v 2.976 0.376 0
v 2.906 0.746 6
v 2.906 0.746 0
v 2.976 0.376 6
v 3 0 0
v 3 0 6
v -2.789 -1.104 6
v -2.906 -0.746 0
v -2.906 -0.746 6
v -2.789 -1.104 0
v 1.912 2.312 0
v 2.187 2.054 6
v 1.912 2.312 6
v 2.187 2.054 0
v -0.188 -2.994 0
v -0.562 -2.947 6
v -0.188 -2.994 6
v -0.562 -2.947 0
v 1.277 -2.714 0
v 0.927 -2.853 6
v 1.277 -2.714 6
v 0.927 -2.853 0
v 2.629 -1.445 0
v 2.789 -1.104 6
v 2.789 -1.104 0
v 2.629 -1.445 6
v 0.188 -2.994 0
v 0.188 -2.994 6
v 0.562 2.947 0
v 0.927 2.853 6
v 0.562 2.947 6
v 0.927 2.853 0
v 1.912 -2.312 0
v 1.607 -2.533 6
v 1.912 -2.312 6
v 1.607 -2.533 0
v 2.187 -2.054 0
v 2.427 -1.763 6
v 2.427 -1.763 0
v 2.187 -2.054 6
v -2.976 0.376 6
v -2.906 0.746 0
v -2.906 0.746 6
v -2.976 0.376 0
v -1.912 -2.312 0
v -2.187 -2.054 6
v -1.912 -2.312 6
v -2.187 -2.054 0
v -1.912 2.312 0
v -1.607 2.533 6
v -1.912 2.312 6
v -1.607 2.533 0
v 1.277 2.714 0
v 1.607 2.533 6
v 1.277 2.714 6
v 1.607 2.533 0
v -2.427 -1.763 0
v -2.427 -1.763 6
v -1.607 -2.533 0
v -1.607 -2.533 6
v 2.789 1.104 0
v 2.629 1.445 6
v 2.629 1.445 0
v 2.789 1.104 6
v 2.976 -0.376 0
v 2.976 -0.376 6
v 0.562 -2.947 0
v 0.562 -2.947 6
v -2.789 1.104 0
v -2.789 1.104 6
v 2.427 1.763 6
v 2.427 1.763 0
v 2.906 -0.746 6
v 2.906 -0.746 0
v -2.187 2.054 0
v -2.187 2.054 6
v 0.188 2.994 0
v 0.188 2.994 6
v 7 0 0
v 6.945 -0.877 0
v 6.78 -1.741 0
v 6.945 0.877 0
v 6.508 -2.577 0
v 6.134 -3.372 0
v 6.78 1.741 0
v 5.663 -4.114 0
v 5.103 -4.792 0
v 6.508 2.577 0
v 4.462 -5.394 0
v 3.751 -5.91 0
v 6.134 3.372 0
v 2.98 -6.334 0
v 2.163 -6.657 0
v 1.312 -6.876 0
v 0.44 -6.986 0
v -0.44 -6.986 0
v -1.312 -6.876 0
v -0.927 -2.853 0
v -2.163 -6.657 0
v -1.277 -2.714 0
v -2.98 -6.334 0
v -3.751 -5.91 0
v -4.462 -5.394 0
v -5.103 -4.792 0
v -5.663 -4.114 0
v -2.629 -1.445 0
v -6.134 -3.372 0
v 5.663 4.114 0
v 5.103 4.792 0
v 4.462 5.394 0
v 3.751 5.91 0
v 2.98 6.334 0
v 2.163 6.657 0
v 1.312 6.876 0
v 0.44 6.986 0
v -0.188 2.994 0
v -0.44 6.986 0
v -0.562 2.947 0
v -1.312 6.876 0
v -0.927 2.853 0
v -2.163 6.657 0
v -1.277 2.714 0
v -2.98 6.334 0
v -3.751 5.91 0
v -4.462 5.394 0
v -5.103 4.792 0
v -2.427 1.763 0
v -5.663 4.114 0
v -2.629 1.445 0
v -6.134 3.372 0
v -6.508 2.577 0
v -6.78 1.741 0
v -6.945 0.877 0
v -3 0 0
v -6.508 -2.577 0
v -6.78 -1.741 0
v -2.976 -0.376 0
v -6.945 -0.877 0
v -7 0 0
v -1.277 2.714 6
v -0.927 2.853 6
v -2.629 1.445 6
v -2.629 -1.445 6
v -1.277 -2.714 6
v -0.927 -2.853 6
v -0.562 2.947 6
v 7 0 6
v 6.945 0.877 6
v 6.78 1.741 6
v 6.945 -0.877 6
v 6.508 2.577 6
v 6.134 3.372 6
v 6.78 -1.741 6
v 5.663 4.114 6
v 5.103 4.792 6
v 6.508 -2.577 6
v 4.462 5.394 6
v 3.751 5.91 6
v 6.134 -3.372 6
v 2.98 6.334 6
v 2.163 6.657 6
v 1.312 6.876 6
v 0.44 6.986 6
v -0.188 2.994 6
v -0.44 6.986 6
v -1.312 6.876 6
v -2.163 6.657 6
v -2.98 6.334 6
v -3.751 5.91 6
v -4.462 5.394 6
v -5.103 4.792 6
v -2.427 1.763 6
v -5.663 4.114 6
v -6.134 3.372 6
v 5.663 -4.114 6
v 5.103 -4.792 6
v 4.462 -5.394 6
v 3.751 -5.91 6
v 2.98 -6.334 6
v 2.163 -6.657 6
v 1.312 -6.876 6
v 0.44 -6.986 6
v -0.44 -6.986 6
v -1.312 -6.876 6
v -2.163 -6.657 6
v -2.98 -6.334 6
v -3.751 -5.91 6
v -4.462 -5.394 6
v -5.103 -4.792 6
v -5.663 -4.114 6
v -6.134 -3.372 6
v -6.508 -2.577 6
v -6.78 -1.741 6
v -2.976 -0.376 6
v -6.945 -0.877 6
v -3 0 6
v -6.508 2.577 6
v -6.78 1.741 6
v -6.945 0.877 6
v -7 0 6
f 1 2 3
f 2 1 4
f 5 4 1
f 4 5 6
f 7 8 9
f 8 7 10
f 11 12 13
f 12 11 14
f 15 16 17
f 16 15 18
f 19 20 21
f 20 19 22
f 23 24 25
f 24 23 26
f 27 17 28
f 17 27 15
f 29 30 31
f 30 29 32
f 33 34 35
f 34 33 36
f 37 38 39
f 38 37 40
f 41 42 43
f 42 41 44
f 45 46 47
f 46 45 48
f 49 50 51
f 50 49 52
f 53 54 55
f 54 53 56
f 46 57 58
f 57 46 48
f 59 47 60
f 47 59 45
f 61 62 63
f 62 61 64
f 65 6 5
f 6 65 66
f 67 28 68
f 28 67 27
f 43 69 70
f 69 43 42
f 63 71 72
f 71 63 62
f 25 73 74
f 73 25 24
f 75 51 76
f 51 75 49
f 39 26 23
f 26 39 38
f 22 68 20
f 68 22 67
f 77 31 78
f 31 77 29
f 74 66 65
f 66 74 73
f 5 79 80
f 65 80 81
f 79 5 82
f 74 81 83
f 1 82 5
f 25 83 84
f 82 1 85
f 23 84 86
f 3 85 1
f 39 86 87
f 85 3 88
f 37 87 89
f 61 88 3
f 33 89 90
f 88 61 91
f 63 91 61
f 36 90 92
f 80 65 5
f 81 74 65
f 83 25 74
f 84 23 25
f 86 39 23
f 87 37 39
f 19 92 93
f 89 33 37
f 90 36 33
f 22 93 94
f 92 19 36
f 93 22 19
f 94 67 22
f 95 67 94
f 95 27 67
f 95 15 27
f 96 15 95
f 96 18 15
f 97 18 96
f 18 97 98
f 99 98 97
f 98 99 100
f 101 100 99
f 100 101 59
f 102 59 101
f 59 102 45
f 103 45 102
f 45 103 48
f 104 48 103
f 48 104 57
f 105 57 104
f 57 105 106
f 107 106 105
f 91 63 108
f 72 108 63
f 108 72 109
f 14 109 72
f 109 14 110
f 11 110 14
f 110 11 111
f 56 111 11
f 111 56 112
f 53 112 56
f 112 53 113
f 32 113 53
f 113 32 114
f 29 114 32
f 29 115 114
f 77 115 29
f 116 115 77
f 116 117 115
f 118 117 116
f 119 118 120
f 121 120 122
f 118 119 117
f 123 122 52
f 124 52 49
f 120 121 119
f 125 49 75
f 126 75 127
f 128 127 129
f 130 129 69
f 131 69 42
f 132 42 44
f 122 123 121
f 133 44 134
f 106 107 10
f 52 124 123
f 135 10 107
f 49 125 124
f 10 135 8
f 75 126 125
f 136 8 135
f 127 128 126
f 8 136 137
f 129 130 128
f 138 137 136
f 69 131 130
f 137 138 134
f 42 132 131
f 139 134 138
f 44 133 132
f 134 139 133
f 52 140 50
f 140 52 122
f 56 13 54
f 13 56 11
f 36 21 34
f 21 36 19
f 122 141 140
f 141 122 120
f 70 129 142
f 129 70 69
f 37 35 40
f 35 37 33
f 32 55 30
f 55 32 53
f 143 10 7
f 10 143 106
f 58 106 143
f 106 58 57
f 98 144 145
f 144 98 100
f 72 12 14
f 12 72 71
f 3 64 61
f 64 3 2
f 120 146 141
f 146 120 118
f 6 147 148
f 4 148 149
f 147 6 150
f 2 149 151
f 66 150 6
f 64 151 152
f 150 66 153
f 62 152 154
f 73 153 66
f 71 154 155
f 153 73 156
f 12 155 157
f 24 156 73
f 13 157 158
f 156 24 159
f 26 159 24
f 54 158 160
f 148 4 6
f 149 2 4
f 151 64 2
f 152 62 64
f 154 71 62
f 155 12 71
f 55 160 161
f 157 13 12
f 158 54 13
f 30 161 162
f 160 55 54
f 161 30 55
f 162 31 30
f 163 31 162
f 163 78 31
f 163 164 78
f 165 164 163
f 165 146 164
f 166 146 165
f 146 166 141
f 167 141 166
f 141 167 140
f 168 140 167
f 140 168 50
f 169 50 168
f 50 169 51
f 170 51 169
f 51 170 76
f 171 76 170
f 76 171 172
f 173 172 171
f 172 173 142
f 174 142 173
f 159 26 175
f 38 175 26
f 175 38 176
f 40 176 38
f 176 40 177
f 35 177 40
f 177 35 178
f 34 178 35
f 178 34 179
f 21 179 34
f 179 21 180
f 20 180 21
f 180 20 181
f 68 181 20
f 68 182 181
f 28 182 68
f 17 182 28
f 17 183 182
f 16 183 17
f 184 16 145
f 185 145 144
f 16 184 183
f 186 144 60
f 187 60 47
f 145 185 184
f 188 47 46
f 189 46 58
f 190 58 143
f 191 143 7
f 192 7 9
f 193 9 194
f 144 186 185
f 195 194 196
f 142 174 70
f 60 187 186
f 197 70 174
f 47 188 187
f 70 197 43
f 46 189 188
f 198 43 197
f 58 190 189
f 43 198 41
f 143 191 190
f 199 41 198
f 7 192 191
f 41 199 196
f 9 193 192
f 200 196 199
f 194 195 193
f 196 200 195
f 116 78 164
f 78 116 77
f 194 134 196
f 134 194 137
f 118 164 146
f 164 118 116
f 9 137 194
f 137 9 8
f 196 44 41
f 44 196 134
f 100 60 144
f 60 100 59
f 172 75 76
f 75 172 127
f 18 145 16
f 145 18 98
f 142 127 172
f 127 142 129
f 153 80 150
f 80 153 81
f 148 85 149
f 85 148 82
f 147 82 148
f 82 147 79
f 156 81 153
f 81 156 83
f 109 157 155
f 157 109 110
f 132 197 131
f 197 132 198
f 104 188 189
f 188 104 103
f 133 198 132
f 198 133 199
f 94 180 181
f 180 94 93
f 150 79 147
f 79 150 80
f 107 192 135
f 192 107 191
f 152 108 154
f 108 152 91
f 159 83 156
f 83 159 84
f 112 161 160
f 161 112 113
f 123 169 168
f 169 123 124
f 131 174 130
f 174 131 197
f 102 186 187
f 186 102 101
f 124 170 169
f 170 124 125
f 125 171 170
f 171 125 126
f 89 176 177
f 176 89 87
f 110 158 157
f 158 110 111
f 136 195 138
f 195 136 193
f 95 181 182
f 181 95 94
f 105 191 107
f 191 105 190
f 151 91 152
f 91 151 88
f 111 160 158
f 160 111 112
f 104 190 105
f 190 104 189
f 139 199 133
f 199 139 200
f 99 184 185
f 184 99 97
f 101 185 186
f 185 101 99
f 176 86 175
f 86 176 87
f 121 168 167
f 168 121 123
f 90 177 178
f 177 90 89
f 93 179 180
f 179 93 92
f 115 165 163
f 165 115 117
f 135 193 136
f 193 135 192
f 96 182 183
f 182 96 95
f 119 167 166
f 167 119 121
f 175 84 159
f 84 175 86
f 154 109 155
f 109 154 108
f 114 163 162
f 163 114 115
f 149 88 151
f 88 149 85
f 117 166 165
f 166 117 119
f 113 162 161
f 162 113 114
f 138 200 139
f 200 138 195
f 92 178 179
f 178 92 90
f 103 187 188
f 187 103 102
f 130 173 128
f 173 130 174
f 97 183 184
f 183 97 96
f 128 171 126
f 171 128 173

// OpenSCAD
$fn = 50;


difference() {
	union() {
		cylinder(h = 6, r = 7.0000000000);
	}
	union() {
		cylinder(h = 6, r = 3.0000000000);
		cylinder(h = 6, r = 1.5000000000);
		cylinder(h = 6, r = 1.5000000000);
		cylinder(h = 6, r = 1.5000000000);
	}
}
